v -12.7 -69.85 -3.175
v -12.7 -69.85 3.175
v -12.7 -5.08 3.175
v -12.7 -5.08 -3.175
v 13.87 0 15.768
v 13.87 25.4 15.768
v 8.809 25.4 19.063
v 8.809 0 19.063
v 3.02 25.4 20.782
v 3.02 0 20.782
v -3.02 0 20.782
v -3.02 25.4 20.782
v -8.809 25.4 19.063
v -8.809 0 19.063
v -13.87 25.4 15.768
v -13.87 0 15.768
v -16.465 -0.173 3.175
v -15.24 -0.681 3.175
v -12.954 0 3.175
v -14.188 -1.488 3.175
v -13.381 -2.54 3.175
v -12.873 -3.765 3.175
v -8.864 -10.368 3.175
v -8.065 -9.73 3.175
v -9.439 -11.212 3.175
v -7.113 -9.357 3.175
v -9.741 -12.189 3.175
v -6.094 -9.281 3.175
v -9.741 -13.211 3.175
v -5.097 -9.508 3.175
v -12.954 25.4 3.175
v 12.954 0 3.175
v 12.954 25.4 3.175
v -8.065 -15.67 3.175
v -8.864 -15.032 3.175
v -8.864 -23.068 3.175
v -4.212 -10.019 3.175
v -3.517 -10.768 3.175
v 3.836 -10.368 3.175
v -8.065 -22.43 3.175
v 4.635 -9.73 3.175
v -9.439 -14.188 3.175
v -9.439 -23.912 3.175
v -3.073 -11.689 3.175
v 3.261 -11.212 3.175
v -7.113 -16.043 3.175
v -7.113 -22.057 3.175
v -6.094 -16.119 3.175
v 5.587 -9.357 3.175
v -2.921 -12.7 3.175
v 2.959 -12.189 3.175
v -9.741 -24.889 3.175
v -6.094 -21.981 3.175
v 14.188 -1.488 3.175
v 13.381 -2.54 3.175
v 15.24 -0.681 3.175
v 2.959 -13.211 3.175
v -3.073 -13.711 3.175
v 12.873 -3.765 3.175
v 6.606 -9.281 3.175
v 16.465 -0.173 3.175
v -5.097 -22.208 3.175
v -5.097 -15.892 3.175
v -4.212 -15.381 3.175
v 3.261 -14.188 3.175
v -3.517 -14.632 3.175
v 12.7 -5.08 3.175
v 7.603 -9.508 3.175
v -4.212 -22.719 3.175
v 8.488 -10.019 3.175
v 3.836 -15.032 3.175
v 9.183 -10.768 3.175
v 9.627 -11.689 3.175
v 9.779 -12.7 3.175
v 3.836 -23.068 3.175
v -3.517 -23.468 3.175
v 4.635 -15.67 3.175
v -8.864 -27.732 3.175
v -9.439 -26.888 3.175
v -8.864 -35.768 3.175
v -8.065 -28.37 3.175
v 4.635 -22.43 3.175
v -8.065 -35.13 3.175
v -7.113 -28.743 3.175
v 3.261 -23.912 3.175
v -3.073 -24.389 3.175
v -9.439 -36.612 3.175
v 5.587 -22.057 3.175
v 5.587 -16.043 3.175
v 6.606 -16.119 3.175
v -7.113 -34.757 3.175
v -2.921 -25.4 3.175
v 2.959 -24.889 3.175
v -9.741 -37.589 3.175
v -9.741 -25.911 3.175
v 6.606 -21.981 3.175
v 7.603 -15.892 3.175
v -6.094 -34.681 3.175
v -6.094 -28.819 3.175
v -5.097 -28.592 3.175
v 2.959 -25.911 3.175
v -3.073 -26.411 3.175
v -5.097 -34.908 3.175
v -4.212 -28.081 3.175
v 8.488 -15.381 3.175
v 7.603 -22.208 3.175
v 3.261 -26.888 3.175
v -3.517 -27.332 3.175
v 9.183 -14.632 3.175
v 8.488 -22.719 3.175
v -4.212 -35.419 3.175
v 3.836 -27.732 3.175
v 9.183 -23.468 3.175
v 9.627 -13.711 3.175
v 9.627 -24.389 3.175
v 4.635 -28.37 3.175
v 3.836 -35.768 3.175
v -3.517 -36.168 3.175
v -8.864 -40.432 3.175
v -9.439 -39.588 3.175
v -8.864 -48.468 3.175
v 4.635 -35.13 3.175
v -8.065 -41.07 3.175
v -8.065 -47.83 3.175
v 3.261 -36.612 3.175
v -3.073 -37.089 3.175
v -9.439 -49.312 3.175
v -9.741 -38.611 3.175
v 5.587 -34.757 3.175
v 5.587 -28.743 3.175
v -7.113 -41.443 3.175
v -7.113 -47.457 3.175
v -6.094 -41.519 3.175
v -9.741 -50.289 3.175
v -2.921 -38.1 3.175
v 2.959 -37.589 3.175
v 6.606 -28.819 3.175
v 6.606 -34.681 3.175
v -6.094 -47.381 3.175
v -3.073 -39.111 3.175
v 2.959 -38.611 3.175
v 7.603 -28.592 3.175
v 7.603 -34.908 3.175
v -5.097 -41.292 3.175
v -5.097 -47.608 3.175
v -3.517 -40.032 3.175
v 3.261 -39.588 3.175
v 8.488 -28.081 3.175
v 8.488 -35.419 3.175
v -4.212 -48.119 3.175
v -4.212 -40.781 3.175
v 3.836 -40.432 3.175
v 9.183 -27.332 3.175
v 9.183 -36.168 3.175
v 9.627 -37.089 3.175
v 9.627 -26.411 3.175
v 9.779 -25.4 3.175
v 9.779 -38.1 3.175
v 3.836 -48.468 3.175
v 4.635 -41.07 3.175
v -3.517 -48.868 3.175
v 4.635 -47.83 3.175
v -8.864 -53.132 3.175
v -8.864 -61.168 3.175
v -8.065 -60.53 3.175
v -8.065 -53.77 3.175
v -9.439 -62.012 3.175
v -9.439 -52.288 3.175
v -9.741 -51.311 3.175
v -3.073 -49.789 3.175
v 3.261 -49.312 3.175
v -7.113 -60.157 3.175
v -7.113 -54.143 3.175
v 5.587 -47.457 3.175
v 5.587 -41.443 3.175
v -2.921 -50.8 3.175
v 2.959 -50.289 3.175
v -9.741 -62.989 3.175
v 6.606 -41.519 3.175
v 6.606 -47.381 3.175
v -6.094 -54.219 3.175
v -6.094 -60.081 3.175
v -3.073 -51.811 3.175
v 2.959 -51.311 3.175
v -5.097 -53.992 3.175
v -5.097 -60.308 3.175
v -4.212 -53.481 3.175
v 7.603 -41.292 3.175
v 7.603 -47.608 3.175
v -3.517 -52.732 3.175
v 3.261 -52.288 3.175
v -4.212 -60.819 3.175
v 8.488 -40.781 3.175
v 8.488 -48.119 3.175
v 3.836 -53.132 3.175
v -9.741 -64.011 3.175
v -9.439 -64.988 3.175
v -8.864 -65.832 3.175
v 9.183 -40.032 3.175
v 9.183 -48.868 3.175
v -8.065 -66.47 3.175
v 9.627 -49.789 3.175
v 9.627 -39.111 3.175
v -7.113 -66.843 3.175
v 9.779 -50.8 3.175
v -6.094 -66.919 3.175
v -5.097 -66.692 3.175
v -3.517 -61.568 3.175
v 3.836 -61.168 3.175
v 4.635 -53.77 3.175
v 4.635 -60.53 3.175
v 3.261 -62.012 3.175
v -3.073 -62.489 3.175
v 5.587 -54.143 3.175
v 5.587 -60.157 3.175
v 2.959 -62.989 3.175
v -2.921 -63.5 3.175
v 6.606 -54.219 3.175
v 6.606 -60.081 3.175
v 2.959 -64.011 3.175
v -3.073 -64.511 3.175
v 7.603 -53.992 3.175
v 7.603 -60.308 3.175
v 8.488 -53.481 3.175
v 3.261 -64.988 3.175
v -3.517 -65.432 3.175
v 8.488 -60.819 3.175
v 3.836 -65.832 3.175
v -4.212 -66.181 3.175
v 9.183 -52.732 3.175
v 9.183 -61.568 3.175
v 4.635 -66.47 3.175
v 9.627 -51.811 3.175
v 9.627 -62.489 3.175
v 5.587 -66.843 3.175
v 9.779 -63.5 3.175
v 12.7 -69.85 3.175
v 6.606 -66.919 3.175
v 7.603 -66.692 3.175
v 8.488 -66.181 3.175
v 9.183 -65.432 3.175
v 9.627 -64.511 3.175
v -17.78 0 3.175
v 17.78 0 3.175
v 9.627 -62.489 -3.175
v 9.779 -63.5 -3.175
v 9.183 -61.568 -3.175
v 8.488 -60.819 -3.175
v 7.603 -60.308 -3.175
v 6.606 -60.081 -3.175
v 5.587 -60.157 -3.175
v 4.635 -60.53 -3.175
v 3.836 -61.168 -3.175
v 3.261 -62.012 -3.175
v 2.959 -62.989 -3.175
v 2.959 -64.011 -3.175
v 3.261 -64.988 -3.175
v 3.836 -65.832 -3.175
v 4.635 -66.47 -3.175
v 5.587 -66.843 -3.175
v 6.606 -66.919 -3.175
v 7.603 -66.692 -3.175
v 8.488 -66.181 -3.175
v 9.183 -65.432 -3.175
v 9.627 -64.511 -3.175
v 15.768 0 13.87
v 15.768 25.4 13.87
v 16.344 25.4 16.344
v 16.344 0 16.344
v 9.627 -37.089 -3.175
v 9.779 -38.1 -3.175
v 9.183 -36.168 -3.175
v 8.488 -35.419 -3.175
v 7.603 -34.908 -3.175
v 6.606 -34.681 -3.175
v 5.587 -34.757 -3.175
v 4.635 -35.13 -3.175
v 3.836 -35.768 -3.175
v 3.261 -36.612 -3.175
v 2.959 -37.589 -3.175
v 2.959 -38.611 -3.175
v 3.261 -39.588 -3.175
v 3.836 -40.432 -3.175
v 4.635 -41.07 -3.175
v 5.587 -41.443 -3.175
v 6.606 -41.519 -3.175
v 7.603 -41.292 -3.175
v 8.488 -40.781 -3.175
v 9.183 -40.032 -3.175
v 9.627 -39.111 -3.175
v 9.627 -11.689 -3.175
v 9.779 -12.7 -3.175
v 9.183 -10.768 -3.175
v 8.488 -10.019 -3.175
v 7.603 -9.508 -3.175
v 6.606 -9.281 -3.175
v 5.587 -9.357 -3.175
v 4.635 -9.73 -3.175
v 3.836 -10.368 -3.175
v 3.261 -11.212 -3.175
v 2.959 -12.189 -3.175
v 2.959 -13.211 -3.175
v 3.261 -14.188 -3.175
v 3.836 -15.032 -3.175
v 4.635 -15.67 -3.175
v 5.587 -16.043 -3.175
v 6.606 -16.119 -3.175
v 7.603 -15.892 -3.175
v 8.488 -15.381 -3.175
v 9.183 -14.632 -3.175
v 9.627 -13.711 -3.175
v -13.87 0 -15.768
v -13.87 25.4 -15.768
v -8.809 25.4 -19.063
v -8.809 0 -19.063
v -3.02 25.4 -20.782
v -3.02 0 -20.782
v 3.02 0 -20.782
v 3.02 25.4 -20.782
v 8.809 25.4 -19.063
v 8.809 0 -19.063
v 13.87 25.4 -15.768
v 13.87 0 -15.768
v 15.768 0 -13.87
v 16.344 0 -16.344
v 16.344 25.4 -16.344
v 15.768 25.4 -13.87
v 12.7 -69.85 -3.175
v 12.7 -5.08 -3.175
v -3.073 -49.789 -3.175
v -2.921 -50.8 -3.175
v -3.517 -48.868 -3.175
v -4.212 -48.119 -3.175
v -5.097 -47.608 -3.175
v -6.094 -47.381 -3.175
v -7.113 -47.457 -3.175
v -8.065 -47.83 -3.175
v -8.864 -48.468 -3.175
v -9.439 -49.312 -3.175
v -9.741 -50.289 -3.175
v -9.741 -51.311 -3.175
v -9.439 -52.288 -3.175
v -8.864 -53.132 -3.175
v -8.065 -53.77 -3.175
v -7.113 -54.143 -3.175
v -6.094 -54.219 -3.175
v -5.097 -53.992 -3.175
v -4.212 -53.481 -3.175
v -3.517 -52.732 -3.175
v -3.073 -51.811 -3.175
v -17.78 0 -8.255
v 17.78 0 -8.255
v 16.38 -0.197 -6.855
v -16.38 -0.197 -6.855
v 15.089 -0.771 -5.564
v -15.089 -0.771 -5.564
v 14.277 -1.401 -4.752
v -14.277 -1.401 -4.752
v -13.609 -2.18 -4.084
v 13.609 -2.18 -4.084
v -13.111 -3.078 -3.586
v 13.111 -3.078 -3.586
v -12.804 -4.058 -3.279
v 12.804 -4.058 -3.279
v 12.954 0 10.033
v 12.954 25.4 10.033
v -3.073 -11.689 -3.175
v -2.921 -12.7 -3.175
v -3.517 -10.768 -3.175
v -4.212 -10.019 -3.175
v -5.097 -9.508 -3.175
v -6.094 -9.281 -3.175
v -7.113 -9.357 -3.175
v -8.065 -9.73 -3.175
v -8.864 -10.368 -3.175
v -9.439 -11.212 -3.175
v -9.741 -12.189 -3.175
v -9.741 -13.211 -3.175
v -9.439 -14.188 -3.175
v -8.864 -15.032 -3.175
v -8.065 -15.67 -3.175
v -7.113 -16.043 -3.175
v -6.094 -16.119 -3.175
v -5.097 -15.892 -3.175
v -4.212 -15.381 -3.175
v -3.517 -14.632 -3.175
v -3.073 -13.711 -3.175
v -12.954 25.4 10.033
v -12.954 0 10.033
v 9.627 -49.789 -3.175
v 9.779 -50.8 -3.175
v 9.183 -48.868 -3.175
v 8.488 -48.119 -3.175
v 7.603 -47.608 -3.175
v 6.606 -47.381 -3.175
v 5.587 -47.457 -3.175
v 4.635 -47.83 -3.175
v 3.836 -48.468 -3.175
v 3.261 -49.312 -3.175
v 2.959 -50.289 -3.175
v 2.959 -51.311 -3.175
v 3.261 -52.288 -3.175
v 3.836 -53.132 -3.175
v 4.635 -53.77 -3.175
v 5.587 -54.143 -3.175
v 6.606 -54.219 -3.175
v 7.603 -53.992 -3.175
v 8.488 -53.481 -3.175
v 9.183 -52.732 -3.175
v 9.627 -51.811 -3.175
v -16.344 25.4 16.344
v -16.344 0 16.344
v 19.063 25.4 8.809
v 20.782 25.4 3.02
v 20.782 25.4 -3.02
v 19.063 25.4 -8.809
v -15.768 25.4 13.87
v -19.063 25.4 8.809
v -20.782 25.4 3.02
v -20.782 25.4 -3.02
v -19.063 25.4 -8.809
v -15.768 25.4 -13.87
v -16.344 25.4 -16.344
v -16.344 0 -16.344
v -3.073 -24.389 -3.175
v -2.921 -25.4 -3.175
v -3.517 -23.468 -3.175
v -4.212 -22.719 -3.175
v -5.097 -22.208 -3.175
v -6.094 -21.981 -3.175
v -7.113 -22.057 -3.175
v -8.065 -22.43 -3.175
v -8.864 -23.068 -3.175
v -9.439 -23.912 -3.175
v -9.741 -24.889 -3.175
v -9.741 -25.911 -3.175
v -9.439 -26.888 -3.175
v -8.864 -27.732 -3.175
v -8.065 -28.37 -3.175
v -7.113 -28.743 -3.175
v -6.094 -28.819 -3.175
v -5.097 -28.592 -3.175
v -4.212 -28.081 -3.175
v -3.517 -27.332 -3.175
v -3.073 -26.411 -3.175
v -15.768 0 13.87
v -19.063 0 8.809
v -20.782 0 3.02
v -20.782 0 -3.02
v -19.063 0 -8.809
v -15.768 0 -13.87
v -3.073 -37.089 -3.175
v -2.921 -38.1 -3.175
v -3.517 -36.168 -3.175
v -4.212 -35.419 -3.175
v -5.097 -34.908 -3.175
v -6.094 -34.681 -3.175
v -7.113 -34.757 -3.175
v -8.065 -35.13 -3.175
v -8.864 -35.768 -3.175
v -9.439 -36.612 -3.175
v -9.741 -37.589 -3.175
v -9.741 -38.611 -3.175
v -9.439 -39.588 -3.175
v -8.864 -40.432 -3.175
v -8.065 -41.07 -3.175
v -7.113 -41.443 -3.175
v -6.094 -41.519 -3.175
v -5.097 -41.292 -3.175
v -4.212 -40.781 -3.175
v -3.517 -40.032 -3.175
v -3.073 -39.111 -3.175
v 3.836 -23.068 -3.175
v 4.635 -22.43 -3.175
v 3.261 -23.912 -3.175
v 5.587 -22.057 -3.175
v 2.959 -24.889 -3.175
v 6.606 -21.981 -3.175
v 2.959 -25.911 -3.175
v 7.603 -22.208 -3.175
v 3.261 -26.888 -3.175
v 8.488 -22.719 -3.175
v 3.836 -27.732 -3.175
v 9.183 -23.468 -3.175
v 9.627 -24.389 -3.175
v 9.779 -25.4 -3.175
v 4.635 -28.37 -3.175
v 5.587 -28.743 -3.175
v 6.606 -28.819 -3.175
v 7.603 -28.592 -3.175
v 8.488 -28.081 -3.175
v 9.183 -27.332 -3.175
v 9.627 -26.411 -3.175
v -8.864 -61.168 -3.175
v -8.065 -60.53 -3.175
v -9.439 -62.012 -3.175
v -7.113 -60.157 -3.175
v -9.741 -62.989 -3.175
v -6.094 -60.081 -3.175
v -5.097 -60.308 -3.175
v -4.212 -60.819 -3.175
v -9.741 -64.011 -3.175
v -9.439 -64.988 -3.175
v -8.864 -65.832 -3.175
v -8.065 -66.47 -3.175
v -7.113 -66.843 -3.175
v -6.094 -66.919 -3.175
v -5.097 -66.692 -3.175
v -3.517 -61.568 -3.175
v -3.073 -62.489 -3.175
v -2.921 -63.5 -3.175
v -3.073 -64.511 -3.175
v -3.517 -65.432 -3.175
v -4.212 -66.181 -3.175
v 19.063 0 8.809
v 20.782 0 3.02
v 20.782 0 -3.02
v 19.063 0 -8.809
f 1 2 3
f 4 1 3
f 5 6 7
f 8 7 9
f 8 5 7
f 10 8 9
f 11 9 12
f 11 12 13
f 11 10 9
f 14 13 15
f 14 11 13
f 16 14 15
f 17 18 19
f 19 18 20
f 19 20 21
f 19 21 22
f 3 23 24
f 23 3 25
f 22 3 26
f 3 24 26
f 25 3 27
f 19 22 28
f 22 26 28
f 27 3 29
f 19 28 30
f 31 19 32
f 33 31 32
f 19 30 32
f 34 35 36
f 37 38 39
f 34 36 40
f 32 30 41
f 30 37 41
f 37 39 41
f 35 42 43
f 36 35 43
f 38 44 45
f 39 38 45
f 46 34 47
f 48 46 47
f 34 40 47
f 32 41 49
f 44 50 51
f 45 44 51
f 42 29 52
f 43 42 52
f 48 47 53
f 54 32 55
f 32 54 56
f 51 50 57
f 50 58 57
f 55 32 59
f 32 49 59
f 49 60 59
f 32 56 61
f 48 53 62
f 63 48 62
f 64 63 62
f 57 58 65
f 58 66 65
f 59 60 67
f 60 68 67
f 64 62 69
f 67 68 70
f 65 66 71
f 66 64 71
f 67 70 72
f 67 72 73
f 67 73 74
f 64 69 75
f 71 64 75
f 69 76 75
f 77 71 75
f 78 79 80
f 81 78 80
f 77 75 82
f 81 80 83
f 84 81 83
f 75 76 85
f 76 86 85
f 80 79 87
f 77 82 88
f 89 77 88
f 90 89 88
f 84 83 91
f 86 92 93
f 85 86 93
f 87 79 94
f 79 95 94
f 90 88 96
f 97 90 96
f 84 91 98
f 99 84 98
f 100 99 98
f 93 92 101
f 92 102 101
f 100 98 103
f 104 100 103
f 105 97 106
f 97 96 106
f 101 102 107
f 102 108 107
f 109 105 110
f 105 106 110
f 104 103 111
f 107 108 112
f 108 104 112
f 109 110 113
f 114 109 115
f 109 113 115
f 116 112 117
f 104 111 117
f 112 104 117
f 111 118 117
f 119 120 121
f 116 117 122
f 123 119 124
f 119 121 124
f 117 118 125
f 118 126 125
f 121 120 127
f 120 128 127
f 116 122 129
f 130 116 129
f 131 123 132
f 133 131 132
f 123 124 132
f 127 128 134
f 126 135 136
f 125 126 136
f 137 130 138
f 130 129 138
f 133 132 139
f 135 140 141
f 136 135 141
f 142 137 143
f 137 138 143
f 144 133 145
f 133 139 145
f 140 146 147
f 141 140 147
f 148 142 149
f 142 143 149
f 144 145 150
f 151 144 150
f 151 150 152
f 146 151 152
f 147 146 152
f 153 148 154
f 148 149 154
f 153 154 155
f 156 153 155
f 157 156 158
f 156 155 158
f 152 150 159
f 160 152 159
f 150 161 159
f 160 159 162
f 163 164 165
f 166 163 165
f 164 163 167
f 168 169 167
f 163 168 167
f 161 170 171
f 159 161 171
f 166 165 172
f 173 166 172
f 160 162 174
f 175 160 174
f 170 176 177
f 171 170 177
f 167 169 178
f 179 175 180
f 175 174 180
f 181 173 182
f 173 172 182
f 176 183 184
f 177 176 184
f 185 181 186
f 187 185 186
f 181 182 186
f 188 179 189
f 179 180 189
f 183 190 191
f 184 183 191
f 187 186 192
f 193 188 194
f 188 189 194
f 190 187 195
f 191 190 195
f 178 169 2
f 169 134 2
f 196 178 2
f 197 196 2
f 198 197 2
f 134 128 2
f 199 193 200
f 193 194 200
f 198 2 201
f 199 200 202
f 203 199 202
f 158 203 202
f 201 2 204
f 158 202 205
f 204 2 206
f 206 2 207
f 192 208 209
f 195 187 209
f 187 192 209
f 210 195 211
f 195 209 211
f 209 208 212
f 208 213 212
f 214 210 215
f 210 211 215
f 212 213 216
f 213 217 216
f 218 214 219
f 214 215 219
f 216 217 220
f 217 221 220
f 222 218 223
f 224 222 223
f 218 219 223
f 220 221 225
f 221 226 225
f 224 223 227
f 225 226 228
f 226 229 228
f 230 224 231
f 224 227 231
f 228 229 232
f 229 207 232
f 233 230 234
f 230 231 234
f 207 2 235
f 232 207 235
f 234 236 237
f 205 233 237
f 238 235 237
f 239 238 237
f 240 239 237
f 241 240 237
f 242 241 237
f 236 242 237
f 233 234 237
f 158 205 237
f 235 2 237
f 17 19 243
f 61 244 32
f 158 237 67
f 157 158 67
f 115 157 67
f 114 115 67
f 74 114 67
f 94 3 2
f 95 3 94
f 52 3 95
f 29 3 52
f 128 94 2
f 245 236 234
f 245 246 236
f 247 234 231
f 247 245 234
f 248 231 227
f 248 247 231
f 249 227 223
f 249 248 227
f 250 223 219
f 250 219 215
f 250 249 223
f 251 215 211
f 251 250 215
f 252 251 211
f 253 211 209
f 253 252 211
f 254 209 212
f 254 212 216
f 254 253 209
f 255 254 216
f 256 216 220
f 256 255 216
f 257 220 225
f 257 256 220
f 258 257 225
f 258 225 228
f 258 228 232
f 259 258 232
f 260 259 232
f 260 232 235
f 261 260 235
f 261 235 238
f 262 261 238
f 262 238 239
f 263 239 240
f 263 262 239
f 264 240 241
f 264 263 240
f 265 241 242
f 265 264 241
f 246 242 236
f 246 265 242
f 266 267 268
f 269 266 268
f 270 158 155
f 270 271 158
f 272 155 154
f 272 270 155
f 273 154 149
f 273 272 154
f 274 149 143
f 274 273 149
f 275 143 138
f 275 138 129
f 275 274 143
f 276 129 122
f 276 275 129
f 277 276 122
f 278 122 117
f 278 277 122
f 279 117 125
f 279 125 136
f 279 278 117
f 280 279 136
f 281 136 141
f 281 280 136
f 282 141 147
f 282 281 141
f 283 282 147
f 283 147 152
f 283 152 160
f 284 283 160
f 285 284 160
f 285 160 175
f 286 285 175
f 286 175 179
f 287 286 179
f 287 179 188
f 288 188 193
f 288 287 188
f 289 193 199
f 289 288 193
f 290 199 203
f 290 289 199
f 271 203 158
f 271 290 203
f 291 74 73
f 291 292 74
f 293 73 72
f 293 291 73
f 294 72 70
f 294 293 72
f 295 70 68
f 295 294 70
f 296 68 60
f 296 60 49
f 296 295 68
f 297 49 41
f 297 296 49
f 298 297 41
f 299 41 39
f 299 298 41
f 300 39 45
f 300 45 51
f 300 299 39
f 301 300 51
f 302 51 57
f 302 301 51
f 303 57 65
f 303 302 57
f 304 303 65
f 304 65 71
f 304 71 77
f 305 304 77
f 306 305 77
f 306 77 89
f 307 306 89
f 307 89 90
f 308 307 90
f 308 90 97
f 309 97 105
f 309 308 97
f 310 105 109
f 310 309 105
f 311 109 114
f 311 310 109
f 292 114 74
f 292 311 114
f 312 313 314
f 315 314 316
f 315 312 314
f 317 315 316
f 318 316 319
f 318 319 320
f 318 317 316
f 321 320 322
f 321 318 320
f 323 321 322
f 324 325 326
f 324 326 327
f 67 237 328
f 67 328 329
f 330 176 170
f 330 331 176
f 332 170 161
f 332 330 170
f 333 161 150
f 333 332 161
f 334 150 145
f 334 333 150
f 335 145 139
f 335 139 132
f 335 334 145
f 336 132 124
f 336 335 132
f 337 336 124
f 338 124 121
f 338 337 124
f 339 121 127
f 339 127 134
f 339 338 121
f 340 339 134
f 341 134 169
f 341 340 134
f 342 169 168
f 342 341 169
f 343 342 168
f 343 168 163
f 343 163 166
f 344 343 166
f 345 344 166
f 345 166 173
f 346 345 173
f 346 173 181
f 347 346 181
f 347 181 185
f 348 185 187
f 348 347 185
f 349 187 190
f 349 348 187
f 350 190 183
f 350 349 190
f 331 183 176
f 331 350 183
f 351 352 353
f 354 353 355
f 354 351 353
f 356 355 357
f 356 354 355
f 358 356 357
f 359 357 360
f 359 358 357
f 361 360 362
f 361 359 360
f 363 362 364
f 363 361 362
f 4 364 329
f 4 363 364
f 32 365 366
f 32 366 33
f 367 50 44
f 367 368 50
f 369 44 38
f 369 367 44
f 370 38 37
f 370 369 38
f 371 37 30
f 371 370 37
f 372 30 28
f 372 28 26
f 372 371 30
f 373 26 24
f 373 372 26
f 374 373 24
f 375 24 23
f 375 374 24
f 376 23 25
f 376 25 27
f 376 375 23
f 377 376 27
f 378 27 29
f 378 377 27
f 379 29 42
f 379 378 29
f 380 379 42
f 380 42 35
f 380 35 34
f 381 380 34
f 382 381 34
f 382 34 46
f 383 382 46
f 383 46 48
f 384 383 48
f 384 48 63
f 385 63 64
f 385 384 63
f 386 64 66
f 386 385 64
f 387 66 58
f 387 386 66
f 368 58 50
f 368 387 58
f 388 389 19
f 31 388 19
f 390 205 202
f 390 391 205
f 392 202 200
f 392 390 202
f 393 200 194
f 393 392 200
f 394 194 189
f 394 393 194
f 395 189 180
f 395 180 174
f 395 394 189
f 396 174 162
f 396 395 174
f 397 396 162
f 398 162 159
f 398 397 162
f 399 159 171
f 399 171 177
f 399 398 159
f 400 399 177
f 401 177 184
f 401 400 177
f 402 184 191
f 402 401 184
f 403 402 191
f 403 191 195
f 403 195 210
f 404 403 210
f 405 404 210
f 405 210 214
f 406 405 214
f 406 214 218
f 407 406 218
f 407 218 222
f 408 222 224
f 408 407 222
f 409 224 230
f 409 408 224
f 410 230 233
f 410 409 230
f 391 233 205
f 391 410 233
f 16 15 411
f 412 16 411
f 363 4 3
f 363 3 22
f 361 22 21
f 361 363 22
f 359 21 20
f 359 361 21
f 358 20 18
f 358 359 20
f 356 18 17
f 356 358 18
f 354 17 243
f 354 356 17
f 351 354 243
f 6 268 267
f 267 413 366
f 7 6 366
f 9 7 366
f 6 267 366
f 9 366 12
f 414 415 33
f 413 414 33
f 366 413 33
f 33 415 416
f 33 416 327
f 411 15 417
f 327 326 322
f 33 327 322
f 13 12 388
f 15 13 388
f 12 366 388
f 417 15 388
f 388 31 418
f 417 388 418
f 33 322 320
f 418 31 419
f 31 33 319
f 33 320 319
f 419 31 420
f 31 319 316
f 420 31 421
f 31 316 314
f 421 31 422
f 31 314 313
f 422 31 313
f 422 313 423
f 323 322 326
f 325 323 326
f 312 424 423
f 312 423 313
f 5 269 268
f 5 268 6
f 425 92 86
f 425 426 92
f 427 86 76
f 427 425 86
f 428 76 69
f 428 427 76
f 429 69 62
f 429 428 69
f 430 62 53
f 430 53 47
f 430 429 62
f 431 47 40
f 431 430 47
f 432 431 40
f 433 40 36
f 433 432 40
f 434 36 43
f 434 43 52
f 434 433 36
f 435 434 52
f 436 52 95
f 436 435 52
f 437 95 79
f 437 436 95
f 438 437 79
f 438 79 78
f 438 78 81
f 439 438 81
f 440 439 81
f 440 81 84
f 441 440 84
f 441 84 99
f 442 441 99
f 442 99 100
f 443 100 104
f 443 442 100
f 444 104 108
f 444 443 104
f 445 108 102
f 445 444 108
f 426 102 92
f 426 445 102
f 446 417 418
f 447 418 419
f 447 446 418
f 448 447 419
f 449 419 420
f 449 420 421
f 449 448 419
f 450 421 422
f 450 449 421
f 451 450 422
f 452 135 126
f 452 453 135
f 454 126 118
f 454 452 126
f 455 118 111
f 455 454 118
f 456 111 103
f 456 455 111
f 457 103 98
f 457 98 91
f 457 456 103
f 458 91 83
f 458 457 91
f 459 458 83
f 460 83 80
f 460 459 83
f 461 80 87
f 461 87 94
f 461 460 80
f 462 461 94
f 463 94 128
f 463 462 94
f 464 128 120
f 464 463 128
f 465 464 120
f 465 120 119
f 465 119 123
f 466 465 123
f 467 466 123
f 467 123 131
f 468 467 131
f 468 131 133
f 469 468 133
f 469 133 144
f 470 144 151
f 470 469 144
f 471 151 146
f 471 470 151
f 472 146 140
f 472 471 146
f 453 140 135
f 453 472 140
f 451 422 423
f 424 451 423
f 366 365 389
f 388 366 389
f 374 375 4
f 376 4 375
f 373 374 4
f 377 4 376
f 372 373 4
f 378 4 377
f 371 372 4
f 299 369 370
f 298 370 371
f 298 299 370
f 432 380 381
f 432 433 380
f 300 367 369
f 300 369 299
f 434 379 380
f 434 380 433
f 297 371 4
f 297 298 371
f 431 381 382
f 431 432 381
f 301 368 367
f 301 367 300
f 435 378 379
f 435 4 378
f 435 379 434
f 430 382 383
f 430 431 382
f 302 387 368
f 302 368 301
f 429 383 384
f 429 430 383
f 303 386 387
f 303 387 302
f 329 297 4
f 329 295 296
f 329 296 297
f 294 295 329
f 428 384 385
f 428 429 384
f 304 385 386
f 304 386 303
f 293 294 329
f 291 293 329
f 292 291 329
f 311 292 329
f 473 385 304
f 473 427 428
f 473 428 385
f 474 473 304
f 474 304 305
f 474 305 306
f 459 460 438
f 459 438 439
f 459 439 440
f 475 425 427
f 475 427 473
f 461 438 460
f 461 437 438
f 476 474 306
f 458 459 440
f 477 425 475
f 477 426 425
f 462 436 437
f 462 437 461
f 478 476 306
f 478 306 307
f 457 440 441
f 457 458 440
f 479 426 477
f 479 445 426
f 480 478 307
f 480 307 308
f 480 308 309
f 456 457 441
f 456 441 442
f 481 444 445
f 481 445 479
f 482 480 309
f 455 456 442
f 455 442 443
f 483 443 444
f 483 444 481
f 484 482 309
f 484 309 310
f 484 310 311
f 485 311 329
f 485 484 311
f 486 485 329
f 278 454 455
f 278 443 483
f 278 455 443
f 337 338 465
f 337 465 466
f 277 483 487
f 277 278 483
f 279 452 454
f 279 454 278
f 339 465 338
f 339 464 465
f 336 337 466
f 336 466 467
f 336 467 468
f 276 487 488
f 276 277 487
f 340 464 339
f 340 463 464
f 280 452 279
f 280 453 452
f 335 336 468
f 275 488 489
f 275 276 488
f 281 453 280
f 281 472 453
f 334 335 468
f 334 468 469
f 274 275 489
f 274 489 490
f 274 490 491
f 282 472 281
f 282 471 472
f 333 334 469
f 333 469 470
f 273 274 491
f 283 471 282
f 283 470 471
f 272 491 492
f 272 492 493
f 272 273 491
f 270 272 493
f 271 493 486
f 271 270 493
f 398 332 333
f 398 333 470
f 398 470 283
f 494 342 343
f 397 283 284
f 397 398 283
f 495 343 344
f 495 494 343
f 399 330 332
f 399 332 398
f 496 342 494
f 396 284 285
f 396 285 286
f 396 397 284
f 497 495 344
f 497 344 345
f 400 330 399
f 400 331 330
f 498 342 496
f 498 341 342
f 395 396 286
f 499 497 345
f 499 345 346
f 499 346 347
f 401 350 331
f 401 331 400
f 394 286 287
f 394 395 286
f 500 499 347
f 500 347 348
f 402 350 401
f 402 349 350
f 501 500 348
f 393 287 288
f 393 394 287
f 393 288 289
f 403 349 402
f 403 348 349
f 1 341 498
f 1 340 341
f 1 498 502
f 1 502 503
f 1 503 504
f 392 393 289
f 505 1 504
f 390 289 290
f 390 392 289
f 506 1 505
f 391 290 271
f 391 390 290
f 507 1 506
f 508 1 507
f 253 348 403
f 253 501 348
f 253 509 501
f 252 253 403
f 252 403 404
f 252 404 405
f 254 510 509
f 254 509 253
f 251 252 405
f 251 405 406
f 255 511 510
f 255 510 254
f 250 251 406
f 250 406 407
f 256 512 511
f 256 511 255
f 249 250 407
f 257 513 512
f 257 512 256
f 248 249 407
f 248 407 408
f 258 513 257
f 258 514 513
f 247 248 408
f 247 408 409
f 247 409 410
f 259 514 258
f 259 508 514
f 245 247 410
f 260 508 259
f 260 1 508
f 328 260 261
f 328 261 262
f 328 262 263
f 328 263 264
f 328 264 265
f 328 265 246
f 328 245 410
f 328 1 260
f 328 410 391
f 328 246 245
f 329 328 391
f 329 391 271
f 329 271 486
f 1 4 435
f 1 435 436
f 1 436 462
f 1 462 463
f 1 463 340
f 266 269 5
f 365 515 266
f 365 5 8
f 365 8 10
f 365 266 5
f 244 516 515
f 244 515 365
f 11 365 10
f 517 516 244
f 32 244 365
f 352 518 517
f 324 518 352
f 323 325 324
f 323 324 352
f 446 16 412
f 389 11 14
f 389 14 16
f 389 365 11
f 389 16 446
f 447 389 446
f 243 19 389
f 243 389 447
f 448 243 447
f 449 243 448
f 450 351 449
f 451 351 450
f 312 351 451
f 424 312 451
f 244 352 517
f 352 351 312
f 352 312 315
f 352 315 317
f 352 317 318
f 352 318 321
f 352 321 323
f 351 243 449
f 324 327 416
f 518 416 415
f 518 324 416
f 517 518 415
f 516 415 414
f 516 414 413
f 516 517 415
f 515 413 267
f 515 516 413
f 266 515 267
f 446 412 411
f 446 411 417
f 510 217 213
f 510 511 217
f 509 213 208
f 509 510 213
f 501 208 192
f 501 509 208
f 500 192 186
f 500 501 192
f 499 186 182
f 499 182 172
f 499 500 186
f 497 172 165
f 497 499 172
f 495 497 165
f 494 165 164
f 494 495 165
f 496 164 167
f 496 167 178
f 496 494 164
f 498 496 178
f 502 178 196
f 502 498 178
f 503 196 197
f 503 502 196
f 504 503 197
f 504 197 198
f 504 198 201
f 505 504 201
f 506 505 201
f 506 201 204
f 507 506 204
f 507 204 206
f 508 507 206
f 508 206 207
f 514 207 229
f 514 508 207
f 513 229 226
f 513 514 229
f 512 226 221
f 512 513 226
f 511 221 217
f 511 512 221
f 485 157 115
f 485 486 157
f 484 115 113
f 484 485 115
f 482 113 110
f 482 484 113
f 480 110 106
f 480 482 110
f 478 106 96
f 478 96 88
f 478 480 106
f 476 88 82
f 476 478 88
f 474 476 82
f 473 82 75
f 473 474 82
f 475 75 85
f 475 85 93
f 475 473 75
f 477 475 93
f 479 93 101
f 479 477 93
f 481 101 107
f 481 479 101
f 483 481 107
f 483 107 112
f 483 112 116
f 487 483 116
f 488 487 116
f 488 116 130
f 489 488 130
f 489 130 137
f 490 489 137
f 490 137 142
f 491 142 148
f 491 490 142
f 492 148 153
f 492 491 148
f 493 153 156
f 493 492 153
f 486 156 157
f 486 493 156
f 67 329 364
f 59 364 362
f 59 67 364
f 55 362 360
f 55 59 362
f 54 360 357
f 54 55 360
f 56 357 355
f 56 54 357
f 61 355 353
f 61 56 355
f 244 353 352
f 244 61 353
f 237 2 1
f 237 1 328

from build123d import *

# Parameters (mm, degrees)
BOSS_EXTRUDE1_DEPTH = 25.4
SKETCH3_W           = 25.4
SKETCH3_H           = 69.85
SKETCH3_R           = 3.429
BOSS_EXTRUDE3_DEPTH = 3.175
SKETCH4_W           = 25.908
SKETCH4_H           = 6.858
CUT_EXTRUDE1_DEPTH  = 76.901399855
FILLET2_R           = 5.08


with BuildPart() as part:
    # Sketch1 → Boss-Extrude1 (new body)
    with BuildSketch(Plane(origin=(0, 0, 0), x_dir=(1, 0, 0), z_dir=(0, 1, 0))):
        with BuildLine():
            Line((13.870085237, 15.767711804), (16.343875029, 16.343875029))
            Line((16.343875029, 16.343875029), (15.767711804, 13.870085237))
            ThreePointArc((15.767711804, 13.870085237), (21, 0), (15.767711804, -13.870085237))
            Line((15.767711804, -13.870085237), (16.343875029, -16.343875029))
            Line((16.343875029, -16.343875029), (13.870085237, -15.767711804))
            ThreePointArc((13.870085237, -15.767711804), (0, -21), (-13.870085237, -15.767711804))
            Line((-13.870085237, -15.767711804), (-16.343875029, -16.343875029))
            Line((-16.343875029, -16.343875029), (-15.767711804, -13.870085237))
            ThreePointArc((-15.767711804, -13.870085237), (-21, 0), (-15.767711804, 13.870085237))
            Line((-15.767711804, 13.870085237), (-16.343875029, 16.343875029))
            Line((-16.343875029, 16.343875029), (-13.870085237, 15.767711804))
            ThreePointArc((-13.870085237, 15.767711804), (0, 21), (13.870085237, 15.767711804))
        make_face()
    extrude(amount=BOSS_EXTRUDE1_DEPTH)

    # Sketch3 → Boss-Extrude3 (add, symmetric)
    with BuildSketch(Plane.XY):
        with Locations((0, -34.925)):
            Rectangle(SKETCH3_W, SKETCH3_H)
        with Locations((-6.35, -12.7)):
            Circle(SKETCH3_R, mode=Mode.SUBTRACT)
        with Locations((6.35, -12.7)):
            Circle(SKETCH3_R, mode=Mode.SUBTRACT)
        with Locations((6.35, -25.4)):
            Circle(SKETCH3_R, mode=Mode.SUBTRACT)
        with Locations((6.35, -38.1)):
            Circle(SKETCH3_R, mode=Mode.SUBTRACT)
        with Locations((6.35, -50.8)):
            Circle(SKETCH3_R, mode=Mode.SUBTRACT)
        with Locations((6.35, -63.5)):
            Circle(SKETCH3_R, mode=Mode.SUBTRACT)
        with Locations((-6.35, -25.4)):
            Circle(SKETCH3_R, mode=Mode.SUBTRACT)
        with Locations((-6.35, -38.1)):
            Circle(SKETCH3_R, mode=Mode.SUBTRACT)
        with Locations((-6.35, -50.8)):
            Circle(SKETCH3_R, mode=Mode.SUBTRACT)
        with Locations((-6.35, -63.5)):
            Circle(SKETCH3_R, mode=Mode.SUBTRACT)
    extrude(amount=BOSS_EXTRUDE3_DEPTH, both=True)

    # Sketch4 → Cut-Extrude1 (cut, through all)
    with BuildSketch(Plane(origin=(0, 0, 0), x_dir=(-1, 0, 0), z_dir=(0, -1, 0))):
        with Locations((0, -6.604)):
            Rectangle(SKETCH4_W, SKETCH4_H)
    extrude(amount=-CUT_EXTRUDE1_DEPTH, mode=Mode.SUBTRACT)

    # Fillet2
    # the kernel refuses this fillet: 5.08 mm, written as the material it adds along each edge
    with BuildSketch(Plane(origin=(-12.7, 0, -3.175), x_dir=(-1, 0, 0), z_dir=(0, 0, 1)), Plane(origin=(12.7, 0, 3.175), x_dir=(1, 0, 0), z_dir=(0, 0, -1))) as fillet2_piece_1:
        with BuildLine():
            CenterArc((FILLET2_R, FILLET2_R), FILLET2_R, 180, 90)
            Line((0, FILLET2_R), (-FILLET2_R * 0.02, FILLET2_R))
            Line((-FILLET2_R * 0.02, FILLET2_R), (-FILLET2_R * 0.02, -FILLET2_R * 0.02))
            Line((-FILLET2_R * 0.02, -FILLET2_R * 0.02), (FILLET2_R, -FILLET2_R * 0.02))
            Line((FILLET2_R, -FILLET2_R * 0.02), (FILLET2_R, 0))
        make_face()
    extrude(amount=6.35)
    with BuildSketch(Plane(origin=(-12.7, 0, -3.175), x_dir=(0, 0, -1), z_dir=(1, 0, 0))) as fillet2_piece_2:
        with BuildLine():
            CenterArc((FILLET2_R, -FILLET2_R), FILLET2_R, 90, 90)
            Line((0, -FILLET2_R), (-FILLET2_R * 0.02, -FILLET2_R))
            Line((-FILLET2_R * 0.02, -FILLET2_R), (-FILLET2_R * 0.02, FILLET2_R * 0.02))
            Line((-FILLET2_R * 0.02, FILLET2_R * 0.02), (FILLET2_R, FILLET2_R * 0.02))
            Line((FILLET2_R, FILLET2_R * 0.02), (FILLET2_R, 0))
        make_face()
    extrude(amount=25.4)
    with BuildSketch(Plane(origin=(-25.4, 0, -3.175), x_dir=(0, 0, -1), z_dir=(1, 0, 0))) as fillet2_piece_3a_section:
        with BuildLine():
            CenterArc((FILLET2_R, -FILLET2_R), FILLET2_R, 90, 90)
            Line((0, -FILLET2_R), (-FILLET2_R * 0.02, -FILLET2_R))
            Line((-FILLET2_R * 0.02, -FILLET2_R), (-FILLET2_R * 0.02, FILLET2_R * 0.02))
            Line((-FILLET2_R * 0.02, FILLET2_R * 0.02), (FILLET2_R, FILLET2_R * 0.02))
            Line((FILLET2_R, FILLET2_R * 0.02), (FILLET2_R, 0))
        make_face()
    fillet2_piece_3a = extrude(amount=38.1, mode=Mode.PRIVATE)
    fillet2_piece_3a = split(fillet2_piece_3a, bisect_by=Plane(origin=(-12.7, -1.15008718, -4.32508718), z_dir=(-1, 0, 0)), keep=Keep.TOP, mode=Mode.PRIVATE)
    with BuildSketch(Plane(origin=(-12.7, 0, -15.875), x_dir=(-1, 0, 0), z_dir=(0, 0, 1))) as fillet2_piece_3b_section:
        with BuildLine():
            CenterArc((FILLET2_R, FILLET2_R), FILLET2_R, 180, 90)
            Line((0, FILLET2_R), (-FILLET2_R * 0.02, FILLET2_R))
            Line((-FILLET2_R * 0.02, FILLET2_R), (-FILLET2_R * 0.02, -FILLET2_R * 0.02))
            Line((-FILLET2_R * 0.02, -FILLET2_R * 0.02), (FILLET2_R, -FILLET2_R * 0.02))
            Line((FILLET2_R, -FILLET2_R * 0.02), (FILLET2_R, 0))
        make_face()
    fillet2_piece_3b = extrude(amount=19.05, mode=Mode.PRIVATE)
    fillet2_piece_3b = split(fillet2_piece_3b, bisect_by=Plane(origin=(-13.85008718, -1.15008718, -3.175), z_dir=(0, 0, -1)), keep=Keep.TOP, mode=Mode.PRIVATE)
    fillet2_piece_3 = fillet2_piece_3a & fillet2_piece_3b
    add(fillet2_piece_3)
    with BuildSketch(Plane(origin=(-12.7, 0, -3.175), x_dir=(0, 0, -1), z_dir=(1, 0, 0))) as fillet2_piece_4a_section:
        with BuildLine():
            CenterArc((FILLET2_R, -FILLET2_R), FILLET2_R, 90, 90)
            Line((0, -FILLET2_R), (-FILLET2_R * 0.02, -FILLET2_R))
            Line((-FILLET2_R * 0.02, -FILLET2_R), (-FILLET2_R * 0.02, FILLET2_R * 0.02))
            Line((-FILLET2_R * 0.02, FILLET2_R * 0.02), (FILLET2_R, FILLET2_R * 0.02))
            Line((FILLET2_R, FILLET2_R * 0.02), (FILLET2_R, 0))
        make_face()
    fillet2_piece_4a = extrude(amount=38.1, mode=Mode.PRIVATE)
    fillet2_piece_4a = split(fillet2_piece_4a, bisect_by=Plane(origin=(12.7, -1.15008718, -4.32508718), z_dir=(1, 0, 0)), keep=Keep.TOP, mode=Mode.PRIVATE)
    with BuildSketch(Plane(origin=(12.7, 0, 3.175), x_dir=(1, 0, 0), z_dir=(0, 0, -1))) as fillet2_piece_4b_section:
        with BuildLine():
            CenterArc((FILLET2_R, FILLET2_R), FILLET2_R, 180, 90)
            Line((0, FILLET2_R), (-FILLET2_R * 0.02, FILLET2_R))
            Line((-FILLET2_R * 0.02, FILLET2_R), (-FILLET2_R * 0.02, -FILLET2_R * 0.02))
            Line((-FILLET2_R * 0.02, -FILLET2_R * 0.02), (FILLET2_R, -FILLET2_R * 0.02))
            Line((FILLET2_R, -FILLET2_R * 0.02), (FILLET2_R, 0))
        make_face()
    fillet2_piece_4b = extrude(amount=19.05, mode=Mode.PRIVATE)
    fillet2_piece_4b = split(fillet2_piece_4b, bisect_by=Plane(origin=(13.85008718, -1.15008718, -3.175), z_dir=(0, 0, -1)), keep=Keep.TOP, mode=Mode.PRIVATE)
    fillet2_piece_4 = fillet2_piece_4a & fillet2_piece_4b
    add(fillet2_piece_4)


solid = part.part
